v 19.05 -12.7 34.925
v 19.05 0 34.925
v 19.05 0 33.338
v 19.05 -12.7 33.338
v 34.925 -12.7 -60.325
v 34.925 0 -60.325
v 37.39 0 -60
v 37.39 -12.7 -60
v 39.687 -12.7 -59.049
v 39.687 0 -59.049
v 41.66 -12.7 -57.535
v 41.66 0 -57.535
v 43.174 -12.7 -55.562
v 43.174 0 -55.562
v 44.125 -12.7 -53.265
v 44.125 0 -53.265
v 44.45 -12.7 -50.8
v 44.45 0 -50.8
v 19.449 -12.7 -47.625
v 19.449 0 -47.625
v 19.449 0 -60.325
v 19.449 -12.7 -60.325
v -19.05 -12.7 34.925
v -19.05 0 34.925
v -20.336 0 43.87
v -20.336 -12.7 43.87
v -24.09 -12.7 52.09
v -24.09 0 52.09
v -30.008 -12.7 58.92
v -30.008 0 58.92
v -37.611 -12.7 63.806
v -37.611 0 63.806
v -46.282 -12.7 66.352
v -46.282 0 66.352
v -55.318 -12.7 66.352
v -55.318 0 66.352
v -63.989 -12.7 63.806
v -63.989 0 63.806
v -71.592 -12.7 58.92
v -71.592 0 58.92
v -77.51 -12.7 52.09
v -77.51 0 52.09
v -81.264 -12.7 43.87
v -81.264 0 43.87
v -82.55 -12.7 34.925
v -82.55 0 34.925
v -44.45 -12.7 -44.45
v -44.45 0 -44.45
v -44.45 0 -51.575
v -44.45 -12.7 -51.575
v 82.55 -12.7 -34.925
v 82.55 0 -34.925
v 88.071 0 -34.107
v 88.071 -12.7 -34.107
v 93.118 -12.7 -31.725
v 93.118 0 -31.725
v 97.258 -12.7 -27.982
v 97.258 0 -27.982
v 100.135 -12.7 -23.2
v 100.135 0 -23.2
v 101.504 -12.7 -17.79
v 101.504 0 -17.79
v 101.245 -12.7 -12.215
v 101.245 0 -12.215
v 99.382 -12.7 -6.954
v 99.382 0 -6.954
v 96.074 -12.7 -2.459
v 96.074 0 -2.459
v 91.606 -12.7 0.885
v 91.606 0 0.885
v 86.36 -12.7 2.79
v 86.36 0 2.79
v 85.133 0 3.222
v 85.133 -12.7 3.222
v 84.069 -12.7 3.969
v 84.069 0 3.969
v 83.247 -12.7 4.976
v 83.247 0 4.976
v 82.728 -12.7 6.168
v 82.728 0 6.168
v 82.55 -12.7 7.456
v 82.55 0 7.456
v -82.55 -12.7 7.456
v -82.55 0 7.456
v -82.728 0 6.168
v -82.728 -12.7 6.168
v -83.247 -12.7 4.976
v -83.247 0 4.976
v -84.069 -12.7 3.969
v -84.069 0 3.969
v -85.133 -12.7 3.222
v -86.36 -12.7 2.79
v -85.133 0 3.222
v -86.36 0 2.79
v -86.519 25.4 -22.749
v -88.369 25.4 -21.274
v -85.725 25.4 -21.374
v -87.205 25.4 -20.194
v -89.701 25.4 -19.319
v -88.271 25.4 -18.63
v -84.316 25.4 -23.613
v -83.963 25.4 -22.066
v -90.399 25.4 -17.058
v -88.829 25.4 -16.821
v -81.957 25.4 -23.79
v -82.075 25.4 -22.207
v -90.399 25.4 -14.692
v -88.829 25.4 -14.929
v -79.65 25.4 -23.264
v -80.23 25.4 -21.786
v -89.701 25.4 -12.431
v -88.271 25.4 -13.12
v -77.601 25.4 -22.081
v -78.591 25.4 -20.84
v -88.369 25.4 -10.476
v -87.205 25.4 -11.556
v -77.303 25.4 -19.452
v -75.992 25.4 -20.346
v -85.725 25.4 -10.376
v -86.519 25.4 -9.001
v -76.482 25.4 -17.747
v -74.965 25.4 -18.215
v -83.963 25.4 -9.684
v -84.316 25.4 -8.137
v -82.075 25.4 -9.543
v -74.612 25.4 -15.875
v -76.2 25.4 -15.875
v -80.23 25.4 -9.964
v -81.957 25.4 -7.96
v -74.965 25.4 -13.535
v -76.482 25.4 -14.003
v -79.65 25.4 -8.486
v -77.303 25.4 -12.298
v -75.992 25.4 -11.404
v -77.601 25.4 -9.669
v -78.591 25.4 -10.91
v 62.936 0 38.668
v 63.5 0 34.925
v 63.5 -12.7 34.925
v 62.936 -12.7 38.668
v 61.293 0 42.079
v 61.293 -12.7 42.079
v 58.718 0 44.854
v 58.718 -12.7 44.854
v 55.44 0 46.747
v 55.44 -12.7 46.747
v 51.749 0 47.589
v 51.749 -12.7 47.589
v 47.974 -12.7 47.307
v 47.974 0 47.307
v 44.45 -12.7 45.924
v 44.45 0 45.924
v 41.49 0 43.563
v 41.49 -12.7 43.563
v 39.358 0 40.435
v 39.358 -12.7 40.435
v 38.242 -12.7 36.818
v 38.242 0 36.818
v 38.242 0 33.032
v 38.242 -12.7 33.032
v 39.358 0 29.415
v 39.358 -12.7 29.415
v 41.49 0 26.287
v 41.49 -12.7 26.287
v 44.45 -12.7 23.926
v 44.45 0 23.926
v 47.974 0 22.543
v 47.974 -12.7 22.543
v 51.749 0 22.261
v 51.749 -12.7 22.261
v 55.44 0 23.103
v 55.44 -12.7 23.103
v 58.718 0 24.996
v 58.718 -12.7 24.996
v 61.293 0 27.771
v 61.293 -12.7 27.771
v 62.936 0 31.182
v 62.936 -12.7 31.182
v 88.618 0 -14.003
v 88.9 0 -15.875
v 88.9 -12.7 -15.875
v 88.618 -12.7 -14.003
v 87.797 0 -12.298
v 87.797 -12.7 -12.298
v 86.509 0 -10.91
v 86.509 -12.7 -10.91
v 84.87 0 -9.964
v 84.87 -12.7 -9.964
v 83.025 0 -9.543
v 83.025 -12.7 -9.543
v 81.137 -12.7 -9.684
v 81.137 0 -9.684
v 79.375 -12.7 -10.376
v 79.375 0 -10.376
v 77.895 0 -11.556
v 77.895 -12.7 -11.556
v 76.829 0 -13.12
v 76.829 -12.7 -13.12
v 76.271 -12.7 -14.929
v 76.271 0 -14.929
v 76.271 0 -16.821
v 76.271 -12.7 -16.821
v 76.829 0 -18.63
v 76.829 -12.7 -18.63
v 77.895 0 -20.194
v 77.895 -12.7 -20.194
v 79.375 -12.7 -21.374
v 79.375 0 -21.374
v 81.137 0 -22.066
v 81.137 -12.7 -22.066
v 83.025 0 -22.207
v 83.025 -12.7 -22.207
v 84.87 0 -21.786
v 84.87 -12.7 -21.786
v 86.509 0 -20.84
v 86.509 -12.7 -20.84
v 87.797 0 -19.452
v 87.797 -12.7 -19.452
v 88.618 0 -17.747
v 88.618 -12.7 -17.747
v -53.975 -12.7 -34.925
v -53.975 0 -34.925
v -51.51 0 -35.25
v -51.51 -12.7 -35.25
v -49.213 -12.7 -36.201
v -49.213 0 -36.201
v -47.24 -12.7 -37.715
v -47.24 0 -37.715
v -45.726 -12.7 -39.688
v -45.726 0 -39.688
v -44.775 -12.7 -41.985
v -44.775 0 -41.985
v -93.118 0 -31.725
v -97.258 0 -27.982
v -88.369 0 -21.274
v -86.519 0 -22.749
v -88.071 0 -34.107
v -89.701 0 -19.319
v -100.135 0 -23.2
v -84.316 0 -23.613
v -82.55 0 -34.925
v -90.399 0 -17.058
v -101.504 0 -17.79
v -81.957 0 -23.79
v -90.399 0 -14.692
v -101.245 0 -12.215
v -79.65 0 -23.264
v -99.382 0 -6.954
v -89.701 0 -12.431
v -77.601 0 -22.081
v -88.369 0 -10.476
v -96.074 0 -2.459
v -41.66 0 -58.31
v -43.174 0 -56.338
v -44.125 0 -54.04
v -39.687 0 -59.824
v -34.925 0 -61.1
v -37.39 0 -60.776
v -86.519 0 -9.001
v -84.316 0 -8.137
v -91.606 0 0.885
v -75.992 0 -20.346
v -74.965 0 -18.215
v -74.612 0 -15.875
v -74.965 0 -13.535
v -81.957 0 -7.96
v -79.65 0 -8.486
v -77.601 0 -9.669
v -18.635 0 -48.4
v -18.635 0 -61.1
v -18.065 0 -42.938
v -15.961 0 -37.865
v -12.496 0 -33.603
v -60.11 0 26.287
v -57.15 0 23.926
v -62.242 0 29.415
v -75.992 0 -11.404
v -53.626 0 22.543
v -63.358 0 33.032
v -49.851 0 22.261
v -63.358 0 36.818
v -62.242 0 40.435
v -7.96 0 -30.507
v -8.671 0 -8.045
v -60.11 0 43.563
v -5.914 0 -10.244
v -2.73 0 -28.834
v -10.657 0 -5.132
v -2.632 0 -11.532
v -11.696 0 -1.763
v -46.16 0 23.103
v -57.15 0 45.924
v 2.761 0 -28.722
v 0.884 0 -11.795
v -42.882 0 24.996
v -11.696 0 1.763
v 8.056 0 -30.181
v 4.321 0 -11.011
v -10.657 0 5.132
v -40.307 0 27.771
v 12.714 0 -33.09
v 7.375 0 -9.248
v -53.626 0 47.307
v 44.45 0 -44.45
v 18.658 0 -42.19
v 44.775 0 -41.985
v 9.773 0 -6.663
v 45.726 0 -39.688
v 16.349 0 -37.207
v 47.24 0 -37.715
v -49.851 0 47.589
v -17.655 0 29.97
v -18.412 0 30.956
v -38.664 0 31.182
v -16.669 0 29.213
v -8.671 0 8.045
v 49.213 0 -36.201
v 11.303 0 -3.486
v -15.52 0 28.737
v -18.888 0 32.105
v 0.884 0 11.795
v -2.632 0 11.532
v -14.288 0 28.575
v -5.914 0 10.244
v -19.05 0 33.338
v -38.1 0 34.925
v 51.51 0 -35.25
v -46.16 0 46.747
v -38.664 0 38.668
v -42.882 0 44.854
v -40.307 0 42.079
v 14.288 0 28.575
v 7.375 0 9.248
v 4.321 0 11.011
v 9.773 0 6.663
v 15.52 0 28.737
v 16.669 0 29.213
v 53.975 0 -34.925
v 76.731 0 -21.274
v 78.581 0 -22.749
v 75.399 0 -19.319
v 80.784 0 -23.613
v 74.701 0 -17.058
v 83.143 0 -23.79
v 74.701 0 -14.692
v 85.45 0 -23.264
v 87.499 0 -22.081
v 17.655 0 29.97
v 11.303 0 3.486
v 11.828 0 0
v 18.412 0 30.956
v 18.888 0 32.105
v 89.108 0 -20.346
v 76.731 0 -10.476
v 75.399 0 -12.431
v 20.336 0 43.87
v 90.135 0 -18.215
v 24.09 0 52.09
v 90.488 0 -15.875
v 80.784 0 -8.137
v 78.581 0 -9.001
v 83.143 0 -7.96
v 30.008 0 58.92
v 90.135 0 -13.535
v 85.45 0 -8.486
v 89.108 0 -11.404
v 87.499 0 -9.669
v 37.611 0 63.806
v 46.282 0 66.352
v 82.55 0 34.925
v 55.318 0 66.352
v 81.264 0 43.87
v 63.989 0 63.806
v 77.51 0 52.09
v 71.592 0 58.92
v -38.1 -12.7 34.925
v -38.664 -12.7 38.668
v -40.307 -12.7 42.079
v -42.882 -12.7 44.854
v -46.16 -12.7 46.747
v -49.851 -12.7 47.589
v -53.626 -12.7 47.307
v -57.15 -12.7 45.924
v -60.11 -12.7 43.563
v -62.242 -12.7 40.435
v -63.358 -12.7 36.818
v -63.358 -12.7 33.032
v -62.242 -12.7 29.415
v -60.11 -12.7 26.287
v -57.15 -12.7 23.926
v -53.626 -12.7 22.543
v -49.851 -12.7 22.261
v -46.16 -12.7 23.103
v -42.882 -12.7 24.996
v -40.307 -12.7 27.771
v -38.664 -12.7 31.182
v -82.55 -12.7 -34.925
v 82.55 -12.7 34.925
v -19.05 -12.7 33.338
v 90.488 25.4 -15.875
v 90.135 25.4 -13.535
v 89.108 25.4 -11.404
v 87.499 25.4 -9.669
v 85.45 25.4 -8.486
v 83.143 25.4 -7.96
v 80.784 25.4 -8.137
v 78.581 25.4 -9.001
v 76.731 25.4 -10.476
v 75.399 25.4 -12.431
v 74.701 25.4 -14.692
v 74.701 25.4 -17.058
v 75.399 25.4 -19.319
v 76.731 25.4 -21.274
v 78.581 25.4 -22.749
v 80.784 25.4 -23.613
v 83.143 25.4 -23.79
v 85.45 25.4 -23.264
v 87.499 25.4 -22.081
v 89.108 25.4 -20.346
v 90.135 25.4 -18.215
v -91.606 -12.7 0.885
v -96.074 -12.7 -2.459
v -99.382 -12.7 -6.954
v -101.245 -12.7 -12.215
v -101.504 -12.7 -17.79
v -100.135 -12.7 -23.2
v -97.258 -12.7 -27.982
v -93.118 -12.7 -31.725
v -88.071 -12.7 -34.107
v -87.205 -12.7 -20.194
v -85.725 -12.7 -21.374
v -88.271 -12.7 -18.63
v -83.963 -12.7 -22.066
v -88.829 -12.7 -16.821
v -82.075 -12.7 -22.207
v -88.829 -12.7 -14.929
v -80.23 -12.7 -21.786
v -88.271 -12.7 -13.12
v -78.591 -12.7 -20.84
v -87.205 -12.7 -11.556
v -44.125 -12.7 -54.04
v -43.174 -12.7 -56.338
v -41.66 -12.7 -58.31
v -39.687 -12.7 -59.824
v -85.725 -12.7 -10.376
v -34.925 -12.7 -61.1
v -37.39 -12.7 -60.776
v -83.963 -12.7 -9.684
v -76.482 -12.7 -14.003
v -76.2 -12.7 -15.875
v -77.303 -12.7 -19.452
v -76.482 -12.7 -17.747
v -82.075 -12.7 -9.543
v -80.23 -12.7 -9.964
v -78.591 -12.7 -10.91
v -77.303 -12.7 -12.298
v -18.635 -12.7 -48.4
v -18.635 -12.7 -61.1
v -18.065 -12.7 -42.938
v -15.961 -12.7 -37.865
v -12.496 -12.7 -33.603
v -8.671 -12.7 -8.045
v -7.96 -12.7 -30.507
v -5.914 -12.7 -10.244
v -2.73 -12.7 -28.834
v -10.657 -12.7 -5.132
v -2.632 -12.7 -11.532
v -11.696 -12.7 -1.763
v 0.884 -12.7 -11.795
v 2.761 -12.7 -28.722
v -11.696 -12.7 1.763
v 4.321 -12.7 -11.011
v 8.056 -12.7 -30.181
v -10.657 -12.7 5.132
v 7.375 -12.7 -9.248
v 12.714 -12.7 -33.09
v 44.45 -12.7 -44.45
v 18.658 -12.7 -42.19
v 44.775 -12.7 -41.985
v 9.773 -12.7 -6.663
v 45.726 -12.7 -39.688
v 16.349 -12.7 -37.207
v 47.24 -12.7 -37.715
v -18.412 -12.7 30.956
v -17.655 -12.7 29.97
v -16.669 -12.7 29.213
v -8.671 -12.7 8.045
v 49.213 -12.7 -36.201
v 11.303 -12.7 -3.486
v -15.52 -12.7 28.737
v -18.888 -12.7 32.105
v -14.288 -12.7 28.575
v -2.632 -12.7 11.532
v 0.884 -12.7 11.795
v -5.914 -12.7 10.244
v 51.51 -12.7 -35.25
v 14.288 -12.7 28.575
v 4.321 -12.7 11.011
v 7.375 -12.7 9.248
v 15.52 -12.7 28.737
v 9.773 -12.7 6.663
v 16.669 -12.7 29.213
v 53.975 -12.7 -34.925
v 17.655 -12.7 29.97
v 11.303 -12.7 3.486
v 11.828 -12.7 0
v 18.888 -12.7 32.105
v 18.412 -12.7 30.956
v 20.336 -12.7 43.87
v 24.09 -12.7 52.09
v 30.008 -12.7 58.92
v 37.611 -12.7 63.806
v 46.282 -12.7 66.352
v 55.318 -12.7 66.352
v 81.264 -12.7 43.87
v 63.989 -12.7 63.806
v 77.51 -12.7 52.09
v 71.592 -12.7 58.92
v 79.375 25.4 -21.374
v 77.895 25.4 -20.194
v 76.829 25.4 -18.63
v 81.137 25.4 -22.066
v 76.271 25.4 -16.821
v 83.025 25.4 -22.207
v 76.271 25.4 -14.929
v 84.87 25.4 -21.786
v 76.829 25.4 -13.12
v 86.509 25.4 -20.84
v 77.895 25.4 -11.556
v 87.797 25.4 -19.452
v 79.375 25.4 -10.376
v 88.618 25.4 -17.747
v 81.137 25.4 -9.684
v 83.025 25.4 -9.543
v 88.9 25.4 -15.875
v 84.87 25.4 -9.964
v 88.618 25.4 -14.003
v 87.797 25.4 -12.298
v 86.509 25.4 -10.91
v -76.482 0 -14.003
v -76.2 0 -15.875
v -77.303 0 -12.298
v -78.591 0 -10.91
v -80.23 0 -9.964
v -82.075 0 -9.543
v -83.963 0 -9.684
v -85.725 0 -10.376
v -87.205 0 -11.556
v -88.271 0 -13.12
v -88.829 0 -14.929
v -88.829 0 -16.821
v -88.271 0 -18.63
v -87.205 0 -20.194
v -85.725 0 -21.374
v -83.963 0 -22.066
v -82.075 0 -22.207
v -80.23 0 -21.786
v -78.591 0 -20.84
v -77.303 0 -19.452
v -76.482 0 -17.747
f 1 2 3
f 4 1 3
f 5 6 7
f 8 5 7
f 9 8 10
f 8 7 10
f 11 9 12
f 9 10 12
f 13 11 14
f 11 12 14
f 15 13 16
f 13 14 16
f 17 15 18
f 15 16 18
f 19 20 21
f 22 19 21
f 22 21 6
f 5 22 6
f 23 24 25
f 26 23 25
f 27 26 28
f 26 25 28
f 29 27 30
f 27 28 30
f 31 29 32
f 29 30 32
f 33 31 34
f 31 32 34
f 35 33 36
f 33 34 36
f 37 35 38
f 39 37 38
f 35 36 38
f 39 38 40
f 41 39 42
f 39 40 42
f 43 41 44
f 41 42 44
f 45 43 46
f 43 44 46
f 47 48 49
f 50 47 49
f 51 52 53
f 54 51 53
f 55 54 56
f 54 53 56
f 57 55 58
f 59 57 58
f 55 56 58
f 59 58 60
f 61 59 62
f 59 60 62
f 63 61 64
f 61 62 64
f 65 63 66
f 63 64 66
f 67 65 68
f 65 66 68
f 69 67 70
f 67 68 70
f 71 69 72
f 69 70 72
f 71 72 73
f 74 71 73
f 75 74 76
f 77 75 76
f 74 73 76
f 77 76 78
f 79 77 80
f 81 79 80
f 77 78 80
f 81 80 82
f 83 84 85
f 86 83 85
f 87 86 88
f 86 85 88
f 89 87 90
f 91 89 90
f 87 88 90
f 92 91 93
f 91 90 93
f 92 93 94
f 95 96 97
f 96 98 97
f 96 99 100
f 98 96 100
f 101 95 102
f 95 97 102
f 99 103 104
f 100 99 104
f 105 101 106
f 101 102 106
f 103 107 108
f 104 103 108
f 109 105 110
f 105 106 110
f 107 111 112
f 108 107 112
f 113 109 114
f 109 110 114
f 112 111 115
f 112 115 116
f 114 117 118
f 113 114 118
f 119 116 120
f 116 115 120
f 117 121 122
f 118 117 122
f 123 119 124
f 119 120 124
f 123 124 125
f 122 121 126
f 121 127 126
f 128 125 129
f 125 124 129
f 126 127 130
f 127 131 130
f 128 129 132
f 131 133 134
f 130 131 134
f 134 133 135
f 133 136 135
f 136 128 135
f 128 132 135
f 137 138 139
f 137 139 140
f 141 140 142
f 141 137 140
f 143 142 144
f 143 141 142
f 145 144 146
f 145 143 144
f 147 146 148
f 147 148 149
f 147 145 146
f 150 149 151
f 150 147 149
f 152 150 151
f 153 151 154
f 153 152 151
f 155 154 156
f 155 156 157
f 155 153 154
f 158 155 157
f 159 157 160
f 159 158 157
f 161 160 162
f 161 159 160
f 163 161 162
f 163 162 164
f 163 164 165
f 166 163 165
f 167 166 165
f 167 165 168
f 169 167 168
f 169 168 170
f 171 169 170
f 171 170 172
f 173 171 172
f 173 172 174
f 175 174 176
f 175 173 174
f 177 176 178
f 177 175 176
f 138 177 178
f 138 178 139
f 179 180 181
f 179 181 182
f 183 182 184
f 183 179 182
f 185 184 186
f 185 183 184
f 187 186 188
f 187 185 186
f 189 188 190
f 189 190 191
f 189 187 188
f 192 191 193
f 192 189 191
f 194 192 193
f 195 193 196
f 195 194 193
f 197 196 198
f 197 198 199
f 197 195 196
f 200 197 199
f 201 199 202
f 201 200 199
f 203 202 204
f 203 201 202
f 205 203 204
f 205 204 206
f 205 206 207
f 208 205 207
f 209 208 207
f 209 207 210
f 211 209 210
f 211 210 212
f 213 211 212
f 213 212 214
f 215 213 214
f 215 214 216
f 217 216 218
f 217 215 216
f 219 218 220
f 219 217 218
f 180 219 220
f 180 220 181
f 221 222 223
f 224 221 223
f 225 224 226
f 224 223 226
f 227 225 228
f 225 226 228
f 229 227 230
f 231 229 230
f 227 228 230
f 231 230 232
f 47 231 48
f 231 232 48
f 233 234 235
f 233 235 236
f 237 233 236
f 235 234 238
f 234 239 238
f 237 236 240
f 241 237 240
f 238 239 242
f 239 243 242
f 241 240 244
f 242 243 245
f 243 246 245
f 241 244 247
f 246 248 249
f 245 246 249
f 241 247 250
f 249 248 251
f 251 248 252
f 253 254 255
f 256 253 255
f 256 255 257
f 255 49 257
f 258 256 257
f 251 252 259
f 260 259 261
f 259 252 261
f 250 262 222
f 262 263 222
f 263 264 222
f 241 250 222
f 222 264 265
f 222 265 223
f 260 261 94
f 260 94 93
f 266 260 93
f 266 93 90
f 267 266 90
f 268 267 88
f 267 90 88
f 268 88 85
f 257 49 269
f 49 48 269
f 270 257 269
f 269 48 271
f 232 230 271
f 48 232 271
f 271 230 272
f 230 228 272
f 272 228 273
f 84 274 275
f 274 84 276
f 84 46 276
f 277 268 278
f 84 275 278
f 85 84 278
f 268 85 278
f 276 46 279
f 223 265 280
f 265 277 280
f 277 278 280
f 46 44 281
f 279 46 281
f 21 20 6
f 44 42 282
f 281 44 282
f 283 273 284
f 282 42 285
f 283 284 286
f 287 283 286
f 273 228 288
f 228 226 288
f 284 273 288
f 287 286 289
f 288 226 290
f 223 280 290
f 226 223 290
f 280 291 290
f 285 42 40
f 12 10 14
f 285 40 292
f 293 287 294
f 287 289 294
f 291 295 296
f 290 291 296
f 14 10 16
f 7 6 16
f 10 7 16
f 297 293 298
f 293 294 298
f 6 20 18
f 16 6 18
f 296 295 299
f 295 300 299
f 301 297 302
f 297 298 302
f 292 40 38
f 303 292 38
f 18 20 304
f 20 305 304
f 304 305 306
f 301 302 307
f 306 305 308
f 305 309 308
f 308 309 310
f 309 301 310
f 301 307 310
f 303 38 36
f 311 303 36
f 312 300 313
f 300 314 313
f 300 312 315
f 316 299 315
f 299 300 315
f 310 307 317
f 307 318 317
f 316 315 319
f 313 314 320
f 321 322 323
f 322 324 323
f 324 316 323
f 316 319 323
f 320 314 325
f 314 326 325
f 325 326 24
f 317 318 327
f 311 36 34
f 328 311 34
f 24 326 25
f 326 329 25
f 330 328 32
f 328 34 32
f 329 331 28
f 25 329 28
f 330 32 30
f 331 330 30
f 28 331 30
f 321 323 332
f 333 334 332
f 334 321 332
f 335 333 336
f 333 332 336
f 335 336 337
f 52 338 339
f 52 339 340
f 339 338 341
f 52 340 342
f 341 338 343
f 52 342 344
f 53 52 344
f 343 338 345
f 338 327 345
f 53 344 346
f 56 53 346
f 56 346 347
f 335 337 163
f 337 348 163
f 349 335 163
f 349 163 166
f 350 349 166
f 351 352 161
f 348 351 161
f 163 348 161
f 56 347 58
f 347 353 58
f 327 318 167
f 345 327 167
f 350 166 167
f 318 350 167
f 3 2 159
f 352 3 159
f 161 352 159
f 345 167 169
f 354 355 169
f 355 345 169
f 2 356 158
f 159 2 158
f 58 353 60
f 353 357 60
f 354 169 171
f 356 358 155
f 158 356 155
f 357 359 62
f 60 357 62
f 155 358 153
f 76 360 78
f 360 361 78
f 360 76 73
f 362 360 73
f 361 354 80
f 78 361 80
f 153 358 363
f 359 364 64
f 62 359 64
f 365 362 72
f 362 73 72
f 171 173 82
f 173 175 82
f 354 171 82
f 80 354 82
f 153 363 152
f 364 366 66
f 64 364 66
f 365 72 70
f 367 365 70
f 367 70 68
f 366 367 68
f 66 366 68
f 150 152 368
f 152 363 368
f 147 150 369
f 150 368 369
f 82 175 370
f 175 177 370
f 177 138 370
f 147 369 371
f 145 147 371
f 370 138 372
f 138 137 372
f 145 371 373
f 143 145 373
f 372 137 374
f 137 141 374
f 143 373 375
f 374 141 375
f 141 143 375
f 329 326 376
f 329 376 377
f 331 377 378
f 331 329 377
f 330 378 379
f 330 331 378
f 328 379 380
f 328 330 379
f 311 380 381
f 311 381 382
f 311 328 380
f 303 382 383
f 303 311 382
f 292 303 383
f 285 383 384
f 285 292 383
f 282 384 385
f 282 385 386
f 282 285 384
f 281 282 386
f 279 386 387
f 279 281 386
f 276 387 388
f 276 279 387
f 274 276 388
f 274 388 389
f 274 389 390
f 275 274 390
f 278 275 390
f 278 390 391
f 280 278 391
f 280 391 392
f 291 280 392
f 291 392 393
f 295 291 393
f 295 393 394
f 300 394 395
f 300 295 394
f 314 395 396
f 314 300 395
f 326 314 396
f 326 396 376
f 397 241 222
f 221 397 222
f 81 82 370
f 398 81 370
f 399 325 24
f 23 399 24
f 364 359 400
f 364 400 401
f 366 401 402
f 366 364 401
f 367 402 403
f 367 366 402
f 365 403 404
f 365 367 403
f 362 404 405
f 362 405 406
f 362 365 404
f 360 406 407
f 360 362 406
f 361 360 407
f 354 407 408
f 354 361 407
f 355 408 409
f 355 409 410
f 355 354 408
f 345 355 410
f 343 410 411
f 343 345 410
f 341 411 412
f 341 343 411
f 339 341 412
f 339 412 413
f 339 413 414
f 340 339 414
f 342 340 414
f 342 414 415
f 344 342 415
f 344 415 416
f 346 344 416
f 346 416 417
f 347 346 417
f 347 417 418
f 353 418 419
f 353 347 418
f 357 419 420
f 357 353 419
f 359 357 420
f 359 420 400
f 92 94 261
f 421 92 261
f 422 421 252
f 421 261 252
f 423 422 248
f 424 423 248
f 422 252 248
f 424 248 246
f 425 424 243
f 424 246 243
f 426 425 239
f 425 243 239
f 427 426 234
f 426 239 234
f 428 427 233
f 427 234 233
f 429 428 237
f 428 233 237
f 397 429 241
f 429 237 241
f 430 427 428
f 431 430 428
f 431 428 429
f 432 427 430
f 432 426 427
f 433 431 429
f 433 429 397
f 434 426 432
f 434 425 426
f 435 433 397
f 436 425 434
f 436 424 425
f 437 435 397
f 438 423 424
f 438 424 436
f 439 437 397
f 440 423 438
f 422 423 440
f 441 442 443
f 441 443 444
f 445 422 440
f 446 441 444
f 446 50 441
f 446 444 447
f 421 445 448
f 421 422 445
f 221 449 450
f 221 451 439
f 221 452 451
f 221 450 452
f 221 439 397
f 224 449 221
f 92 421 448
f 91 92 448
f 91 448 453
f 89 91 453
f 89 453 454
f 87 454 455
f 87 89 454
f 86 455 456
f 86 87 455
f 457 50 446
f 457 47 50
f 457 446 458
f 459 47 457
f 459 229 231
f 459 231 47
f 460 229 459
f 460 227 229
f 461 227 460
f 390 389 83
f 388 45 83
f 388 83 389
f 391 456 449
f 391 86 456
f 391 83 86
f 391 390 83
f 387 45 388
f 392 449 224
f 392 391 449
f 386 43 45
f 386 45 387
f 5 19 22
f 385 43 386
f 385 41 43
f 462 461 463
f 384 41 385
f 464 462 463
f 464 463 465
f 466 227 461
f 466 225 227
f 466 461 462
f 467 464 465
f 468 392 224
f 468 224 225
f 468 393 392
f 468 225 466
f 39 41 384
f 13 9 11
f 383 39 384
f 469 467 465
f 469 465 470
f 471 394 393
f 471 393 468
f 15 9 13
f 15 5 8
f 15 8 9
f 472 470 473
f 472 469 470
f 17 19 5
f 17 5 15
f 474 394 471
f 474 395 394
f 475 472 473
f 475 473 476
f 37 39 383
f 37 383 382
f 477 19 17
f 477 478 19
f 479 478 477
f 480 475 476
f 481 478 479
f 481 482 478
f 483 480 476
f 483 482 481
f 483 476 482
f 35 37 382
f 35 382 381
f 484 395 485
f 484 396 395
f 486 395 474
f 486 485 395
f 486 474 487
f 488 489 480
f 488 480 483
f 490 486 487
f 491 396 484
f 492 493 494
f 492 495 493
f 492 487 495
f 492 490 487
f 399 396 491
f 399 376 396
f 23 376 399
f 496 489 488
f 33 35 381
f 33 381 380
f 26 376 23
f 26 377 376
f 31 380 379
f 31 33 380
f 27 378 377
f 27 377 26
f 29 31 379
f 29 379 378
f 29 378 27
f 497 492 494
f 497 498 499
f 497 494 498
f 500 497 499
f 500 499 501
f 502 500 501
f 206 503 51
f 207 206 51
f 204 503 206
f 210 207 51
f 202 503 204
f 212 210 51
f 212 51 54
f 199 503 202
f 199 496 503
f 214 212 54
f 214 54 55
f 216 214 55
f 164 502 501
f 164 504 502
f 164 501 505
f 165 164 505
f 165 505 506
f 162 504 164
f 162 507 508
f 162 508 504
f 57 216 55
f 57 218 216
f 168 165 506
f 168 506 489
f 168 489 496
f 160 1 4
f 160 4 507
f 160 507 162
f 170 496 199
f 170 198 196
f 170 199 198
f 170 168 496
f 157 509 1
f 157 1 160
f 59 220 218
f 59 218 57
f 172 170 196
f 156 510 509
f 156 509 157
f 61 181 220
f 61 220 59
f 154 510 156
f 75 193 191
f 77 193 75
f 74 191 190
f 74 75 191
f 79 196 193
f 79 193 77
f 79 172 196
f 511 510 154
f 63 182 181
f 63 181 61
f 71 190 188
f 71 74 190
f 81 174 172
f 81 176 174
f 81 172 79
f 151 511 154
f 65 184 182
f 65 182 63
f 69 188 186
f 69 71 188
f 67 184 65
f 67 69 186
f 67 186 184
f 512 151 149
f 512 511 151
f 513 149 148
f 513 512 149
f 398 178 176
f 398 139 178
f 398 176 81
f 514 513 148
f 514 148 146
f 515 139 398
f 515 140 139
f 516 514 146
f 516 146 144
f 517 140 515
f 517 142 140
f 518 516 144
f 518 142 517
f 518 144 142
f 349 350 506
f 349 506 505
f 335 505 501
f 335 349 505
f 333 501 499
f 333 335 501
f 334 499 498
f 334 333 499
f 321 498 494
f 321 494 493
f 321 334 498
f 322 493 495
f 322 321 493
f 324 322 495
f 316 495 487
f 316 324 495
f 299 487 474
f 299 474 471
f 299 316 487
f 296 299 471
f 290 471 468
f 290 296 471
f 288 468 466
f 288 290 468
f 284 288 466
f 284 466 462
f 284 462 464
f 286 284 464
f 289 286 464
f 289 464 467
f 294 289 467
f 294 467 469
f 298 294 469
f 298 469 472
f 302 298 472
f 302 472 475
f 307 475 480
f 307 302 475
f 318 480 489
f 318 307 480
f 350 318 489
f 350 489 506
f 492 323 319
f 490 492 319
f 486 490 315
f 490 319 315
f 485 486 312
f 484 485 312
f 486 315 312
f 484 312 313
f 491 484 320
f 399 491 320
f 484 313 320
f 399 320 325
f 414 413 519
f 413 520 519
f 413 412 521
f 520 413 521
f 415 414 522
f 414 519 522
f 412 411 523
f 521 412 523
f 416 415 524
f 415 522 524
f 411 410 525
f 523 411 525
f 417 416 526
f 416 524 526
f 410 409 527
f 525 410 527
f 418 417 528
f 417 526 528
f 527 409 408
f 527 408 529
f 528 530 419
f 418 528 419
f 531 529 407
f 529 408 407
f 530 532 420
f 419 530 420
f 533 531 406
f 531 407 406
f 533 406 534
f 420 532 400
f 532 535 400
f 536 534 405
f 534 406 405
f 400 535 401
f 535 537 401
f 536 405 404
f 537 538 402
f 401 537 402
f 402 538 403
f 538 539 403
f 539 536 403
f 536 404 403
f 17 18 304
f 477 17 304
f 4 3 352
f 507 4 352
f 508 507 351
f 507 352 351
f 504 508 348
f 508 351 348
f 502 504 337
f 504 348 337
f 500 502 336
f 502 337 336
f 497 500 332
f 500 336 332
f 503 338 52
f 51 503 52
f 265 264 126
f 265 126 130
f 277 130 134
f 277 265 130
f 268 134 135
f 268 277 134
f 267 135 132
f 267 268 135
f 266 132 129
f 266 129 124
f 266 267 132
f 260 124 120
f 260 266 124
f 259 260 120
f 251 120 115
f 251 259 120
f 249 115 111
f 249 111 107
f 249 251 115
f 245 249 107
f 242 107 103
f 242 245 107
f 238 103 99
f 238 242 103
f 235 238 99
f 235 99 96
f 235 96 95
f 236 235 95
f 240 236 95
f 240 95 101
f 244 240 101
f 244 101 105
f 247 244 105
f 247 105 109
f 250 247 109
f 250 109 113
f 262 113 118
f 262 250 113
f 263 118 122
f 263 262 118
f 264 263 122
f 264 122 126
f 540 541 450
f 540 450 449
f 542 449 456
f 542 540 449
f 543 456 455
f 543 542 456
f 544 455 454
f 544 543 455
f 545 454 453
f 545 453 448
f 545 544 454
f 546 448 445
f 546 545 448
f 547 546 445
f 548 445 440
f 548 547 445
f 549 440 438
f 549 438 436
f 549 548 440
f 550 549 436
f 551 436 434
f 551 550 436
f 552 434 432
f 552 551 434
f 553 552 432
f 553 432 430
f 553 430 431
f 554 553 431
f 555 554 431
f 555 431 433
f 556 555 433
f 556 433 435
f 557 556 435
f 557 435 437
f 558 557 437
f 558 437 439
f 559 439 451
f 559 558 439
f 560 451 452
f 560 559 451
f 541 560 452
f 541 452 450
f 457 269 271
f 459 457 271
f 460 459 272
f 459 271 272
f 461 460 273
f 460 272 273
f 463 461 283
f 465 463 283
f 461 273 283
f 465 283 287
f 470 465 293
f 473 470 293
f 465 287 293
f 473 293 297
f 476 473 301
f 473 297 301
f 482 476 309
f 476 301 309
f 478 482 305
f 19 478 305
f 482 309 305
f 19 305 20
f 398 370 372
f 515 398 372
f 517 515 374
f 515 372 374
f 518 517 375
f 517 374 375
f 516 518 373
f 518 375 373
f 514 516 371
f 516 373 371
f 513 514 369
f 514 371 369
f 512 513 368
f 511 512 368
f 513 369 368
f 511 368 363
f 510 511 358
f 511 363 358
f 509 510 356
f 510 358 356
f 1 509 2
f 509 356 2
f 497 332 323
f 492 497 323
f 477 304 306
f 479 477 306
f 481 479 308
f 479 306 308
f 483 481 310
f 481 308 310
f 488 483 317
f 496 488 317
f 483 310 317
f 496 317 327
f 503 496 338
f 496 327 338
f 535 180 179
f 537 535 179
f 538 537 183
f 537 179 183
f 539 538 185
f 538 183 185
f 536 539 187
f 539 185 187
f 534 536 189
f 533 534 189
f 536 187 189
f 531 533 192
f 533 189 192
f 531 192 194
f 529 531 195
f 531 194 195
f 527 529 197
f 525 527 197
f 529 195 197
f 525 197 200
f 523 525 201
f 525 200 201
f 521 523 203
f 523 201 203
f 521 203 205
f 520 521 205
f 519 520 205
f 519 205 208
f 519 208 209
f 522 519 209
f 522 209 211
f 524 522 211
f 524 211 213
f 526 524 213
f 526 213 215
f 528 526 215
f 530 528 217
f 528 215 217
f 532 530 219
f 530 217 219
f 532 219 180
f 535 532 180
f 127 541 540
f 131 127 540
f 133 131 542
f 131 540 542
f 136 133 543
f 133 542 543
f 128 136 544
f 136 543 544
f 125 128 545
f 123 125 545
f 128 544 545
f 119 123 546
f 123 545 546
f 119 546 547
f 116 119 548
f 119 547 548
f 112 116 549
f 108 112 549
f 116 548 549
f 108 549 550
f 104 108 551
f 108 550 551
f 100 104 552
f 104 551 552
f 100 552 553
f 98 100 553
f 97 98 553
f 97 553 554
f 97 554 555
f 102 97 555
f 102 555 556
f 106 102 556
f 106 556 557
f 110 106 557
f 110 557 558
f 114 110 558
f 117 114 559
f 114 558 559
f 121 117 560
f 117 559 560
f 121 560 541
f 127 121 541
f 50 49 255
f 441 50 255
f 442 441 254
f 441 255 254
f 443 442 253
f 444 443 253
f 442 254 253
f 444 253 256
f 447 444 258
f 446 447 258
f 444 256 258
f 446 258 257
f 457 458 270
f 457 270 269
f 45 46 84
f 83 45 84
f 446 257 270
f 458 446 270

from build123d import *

# Parameters (mm, degrees)
F0_R     = 7.9375
F0_R_2   = 11.828435
F0_R_3   = 12.7
F0_R_4   = 6.35
F1_DEPTH = 12.7
F2_DEPTH = 25.4
F3_DEPTH = 25.4


with BuildPart() as f1:
    # F0 (on Front) → F1 (new body)
    with BuildSketch(Plane.XZ):
        with BuildLine():
            Line((82.55, 7.45639), (82.55, 34.925))
            ThreePointArc((82.55, 34.925), (50.8, 66.675), (19.05, 34.925))
            Line((19.05, 34.925), (19.05, 33.3375))
            ThreePointArc((19.05, 33.3375), (17.655096, 29.969904), (14.2875, 28.575))
            Line((14.2875, 28.575), (-14.2875, 28.575))
            ThreePointArc((-14.2875, 28.575), (-17.655096, 29.969904), (-19.05, 33.3375))
            Line((-19.05, 33.3375), (-19.05, 34.925))
            ThreePointArc((-19.05, 34.925), (-50.8, 66.675), (-82.55, 34.925))
            Line((-82.55, 34.925), (-82.55, 7.45639))
            ThreePointArc((-82.55, 7.45639), (-83.623483, 4.44432), (-86.36, 2.790112))
            ThreePointArc((-86.36, 2.790112), (-101.503534, -17.789696), (-82.55, -34.925))
            Line((-82.55, -34.925), (-53.975, -34.925))
            ThreePointArc((-53.975, -34.925), (-47.239808, -37.714808), (-44.45, -44.45))
            Line((-44.45, -44.45), (-44.45, -51.575074))
            ThreePointArc((-44.45, -51.575074), (-41.660192, -58.310266), (-34.925, -61.100074))
            Line((-34.925, -61.100074), (-18.634955, -61.100074))
            Line((-18.634955, -61.100074), (-18.634955, -48.400074))
            ThreePointArc((-18.634955, -48.400074), (0.011654, -28.578944), (19.449271, -47.625))
            Line((19.449271, -47.625), (19.449271, -60.325))
            Line((19.449271, -60.325), (34.925, -60.325))
            ThreePointArc((34.925, -60.325), (41.660192, -57.535192), (44.45, -50.8))
            Line((44.45, -50.8), (44.45, -44.45))
            ThreePointArc((44.45, -44.45), (47.239808, -37.714808), (53.975, -34.925))
            Line((53.975, -34.925), (82.55, -34.925))
            ThreePointArc((82.55, -34.925), (101.503534, -17.789696), (86.36, 2.790112))
            ThreePointArc((86.36, 2.790112), (83.623483, 4.44432), (82.55, 7.45639))
        make_face()
        with Locations((-82.55, -15.875)):
            Circle(F0_R, mode=Mode.SUBTRACT)
        Circle(F0_R_2, mode=Mode.SUBTRACT)
        with Locations((82.55, -15.875)):
            Circle(F0_R, mode=Mode.SUBTRACT)
        with Locations((-50.8, 34.925)):
            Circle(F0_R_3, mode=Mode.SUBTRACT)
        with Locations((50.8, 34.925)):
            Circle(F0_R_3, mode=Mode.SUBTRACT)
        with Locations((-82.55, -15.875)):
            Circle(F0_R)
        with Locations((-82.55, -15.875)):
            Circle(F0_R_4, mode=Mode.SUBTRACT)
        with Locations((82.55, -15.875)):
            Circle(F0_R)
        with Locations((82.55, -15.875)):
            Circle(F0_R_4, mode=Mode.SUBTRACT)
    extrude(amount=F1_DEPTH)

    # F0 (on Front) → F2 (join)
    with BuildSketch(Plane.XZ):
        with Locations((82.55, -15.875)):
            Circle(F0_R)
        with Locations((82.55, -15.875)):
            Circle(F0_R_4, mode=Mode.SUBTRACT)
    extrude(amount=-F2_DEPTH)

    # F0 (on Front) → F3 (join)
    with BuildSketch(Plane.XZ):
        with Locations((-82.55, -15.875)):
            Circle(F0_R)
        with Locations((-82.55, -15.875)):
            Circle(F0_R_4, mode=Mode.SUBTRACT)
    extrude(amount=-F3_DEPTH)


solid = f1.part
